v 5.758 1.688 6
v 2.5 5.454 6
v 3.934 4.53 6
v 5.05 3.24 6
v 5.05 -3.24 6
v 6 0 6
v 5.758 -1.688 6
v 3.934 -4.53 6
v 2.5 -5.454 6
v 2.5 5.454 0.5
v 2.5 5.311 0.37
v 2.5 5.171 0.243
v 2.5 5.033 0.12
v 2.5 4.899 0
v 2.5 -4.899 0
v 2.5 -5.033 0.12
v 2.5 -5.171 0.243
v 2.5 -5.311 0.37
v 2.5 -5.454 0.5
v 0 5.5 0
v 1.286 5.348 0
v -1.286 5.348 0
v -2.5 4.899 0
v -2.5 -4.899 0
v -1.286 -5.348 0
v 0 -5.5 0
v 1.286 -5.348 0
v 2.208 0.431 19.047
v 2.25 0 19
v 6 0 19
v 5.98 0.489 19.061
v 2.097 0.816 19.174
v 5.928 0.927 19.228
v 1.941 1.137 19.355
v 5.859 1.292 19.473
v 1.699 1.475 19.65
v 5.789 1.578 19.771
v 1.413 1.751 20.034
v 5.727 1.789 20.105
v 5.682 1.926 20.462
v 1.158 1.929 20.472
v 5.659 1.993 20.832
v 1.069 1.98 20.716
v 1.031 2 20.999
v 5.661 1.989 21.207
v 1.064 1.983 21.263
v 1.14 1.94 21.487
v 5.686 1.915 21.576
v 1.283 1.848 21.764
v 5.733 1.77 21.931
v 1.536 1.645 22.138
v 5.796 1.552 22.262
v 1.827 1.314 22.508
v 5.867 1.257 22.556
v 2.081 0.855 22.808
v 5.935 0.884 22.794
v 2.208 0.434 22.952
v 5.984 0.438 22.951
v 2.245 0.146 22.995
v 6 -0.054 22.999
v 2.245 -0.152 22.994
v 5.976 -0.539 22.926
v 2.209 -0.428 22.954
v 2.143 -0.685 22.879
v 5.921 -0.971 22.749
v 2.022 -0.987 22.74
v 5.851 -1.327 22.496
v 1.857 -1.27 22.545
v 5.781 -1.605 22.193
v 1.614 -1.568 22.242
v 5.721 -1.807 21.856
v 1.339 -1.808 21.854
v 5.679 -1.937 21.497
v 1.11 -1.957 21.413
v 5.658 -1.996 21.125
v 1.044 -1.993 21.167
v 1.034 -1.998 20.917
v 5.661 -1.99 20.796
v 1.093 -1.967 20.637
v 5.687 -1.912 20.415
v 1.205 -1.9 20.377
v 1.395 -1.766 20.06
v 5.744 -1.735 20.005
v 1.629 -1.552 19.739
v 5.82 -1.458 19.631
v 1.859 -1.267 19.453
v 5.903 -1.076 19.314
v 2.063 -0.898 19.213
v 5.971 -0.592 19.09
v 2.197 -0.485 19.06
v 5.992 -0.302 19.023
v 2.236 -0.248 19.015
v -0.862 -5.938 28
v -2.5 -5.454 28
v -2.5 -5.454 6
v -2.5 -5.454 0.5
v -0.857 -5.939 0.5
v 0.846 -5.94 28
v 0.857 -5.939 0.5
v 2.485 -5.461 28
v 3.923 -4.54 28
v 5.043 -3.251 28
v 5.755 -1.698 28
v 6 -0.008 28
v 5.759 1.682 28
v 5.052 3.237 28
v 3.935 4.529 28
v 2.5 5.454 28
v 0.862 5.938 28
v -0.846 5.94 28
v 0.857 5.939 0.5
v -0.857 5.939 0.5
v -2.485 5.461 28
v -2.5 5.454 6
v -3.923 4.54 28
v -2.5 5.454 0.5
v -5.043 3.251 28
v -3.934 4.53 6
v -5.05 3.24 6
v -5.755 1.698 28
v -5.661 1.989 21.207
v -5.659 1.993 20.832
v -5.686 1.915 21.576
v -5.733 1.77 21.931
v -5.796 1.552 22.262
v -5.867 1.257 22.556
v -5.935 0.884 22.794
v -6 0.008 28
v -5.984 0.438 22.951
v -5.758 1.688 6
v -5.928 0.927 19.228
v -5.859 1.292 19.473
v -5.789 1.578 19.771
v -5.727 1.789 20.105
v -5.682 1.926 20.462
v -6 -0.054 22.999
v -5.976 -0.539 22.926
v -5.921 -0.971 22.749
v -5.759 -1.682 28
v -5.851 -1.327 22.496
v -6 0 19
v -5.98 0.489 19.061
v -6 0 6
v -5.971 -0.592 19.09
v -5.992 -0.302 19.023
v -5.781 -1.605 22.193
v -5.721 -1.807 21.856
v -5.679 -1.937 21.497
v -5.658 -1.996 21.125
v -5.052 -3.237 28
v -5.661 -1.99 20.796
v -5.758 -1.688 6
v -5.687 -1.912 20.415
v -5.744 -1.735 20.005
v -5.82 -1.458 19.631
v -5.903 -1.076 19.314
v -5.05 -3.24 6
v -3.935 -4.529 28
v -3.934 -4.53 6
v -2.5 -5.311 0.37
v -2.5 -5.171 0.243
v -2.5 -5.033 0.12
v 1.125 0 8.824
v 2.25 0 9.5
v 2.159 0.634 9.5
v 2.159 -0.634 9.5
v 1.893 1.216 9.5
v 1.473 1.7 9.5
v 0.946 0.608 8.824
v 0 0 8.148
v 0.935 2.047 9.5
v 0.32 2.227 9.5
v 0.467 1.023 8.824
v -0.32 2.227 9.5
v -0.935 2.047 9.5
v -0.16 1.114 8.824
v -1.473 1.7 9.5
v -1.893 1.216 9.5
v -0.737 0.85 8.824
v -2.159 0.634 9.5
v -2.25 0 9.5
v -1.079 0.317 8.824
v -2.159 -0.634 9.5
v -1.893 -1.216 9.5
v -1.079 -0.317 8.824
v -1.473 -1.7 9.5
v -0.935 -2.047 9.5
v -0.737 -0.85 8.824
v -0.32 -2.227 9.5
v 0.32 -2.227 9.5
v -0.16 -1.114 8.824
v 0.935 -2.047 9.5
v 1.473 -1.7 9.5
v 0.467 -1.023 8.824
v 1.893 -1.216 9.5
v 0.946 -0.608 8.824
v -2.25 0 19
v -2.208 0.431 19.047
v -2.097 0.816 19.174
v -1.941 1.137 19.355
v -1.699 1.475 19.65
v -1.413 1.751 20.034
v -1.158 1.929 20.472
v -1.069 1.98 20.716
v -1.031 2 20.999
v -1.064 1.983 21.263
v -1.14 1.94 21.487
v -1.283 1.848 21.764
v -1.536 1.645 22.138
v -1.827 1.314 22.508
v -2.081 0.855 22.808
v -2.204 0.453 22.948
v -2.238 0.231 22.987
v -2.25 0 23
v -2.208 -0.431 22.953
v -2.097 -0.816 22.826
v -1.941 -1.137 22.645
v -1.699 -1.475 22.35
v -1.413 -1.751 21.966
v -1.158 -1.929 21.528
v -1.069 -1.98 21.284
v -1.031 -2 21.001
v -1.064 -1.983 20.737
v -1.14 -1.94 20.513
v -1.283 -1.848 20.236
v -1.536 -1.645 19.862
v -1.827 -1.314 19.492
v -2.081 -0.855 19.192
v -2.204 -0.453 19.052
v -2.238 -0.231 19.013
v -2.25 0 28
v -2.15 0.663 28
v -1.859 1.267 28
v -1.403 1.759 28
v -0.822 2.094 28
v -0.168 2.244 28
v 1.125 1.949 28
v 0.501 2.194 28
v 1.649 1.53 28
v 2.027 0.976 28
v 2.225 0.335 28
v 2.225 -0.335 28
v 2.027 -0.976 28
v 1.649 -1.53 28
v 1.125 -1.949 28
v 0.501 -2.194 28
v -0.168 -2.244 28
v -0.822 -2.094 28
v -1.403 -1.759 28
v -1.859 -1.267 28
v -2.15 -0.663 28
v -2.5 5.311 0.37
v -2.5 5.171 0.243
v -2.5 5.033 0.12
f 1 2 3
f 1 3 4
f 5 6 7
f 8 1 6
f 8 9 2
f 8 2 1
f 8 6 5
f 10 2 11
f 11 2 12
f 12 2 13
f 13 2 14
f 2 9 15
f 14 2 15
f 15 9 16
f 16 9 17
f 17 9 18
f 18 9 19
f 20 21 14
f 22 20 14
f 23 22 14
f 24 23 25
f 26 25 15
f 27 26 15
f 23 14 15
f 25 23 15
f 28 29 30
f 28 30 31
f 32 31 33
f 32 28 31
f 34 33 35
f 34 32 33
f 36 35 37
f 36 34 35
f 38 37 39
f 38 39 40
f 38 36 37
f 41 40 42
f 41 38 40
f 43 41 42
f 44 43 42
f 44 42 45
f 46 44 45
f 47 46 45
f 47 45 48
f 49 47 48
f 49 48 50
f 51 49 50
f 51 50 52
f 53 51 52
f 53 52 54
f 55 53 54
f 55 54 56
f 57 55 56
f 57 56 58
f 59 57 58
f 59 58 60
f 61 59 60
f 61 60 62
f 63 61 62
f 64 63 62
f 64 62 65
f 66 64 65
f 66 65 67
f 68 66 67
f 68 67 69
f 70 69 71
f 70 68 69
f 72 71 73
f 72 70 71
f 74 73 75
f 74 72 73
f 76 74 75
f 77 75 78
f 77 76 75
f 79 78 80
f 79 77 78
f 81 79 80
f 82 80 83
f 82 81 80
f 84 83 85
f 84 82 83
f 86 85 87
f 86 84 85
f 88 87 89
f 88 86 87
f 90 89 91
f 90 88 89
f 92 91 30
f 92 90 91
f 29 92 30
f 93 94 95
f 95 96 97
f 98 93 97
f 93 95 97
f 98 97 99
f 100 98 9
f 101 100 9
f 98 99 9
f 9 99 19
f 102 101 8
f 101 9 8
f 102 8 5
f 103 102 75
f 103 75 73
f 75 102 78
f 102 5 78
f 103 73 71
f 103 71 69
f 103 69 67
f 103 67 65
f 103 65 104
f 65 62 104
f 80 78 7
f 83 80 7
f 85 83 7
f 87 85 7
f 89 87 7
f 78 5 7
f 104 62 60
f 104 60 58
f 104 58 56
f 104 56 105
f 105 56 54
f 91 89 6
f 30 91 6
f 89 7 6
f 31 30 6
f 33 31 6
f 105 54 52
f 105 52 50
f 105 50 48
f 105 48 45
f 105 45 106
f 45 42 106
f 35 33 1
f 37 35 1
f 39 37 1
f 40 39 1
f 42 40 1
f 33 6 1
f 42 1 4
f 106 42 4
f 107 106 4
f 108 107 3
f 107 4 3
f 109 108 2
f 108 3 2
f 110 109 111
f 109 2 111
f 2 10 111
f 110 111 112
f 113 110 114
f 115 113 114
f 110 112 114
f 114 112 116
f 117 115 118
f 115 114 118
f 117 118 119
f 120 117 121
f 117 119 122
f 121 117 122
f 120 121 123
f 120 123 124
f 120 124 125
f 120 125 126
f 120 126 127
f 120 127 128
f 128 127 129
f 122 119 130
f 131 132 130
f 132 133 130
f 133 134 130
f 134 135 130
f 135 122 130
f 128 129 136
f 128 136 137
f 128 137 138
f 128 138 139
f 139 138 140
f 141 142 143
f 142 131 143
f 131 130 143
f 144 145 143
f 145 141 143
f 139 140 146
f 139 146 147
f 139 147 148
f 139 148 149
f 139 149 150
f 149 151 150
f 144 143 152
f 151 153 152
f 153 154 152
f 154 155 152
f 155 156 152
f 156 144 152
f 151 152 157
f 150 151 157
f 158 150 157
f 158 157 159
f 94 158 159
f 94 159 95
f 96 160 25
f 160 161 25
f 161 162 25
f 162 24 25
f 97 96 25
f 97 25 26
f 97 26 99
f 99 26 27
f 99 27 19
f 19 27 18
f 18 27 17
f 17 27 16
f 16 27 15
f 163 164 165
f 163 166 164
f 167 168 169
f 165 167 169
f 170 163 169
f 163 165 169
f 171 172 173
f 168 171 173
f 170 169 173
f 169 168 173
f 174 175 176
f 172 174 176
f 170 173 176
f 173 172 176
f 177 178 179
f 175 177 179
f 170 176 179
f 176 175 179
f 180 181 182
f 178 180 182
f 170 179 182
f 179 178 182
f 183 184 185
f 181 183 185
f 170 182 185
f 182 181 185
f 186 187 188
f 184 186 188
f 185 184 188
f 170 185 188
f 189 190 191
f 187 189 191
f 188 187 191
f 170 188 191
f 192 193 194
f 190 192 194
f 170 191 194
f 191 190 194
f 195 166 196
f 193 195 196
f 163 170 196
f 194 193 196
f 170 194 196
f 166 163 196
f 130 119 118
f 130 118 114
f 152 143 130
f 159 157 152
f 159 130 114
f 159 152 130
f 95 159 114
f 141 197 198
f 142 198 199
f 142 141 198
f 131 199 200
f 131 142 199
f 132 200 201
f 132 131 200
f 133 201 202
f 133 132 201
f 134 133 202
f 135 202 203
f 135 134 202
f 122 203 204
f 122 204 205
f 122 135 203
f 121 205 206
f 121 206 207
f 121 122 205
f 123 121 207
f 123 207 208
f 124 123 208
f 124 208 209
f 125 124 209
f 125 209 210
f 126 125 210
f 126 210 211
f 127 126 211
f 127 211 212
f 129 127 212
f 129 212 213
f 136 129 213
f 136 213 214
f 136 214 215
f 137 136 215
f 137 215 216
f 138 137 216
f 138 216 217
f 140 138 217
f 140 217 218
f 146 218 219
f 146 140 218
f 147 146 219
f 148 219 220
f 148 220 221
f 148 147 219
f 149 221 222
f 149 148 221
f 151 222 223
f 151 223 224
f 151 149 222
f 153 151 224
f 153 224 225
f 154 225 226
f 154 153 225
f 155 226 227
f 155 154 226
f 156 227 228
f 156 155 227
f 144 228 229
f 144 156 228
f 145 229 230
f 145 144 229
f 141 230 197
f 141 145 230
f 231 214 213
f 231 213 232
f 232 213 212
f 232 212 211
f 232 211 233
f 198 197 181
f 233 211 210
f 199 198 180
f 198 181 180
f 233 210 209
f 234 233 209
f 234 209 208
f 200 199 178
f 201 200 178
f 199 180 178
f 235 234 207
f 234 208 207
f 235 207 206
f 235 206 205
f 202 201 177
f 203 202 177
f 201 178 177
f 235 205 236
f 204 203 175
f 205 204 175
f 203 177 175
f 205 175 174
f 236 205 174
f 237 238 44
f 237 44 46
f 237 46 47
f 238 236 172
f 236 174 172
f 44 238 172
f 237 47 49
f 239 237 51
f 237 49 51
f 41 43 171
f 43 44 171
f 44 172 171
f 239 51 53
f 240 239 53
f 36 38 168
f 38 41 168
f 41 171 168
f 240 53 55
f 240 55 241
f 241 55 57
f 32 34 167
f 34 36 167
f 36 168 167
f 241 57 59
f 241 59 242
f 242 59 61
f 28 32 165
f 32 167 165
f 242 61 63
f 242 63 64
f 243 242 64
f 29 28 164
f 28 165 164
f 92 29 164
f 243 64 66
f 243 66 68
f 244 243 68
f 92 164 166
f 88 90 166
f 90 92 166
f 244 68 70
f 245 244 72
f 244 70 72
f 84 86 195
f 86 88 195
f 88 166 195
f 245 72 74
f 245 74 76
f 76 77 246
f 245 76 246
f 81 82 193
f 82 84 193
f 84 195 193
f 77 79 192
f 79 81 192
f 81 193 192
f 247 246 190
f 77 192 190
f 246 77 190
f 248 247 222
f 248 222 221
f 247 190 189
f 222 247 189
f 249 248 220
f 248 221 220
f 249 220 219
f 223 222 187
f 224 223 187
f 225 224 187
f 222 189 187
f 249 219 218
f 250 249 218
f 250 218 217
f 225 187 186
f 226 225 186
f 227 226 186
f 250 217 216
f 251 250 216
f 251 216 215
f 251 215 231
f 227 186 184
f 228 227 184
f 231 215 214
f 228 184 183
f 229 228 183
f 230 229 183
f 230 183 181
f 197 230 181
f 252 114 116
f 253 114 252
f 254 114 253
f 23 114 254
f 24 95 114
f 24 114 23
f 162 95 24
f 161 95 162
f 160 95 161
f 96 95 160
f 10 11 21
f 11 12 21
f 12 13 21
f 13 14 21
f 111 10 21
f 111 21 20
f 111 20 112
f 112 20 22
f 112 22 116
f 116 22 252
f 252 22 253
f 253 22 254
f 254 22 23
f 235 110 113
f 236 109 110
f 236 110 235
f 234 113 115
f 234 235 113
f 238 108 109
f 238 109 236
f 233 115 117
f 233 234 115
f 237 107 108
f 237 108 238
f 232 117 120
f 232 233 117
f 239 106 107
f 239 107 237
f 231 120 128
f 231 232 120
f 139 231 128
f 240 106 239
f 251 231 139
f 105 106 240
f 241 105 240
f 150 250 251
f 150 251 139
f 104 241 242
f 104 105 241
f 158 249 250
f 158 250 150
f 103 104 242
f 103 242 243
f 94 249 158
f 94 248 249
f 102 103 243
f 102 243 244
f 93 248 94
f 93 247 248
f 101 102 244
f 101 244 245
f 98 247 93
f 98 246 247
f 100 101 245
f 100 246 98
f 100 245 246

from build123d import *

# Parameters (mm, degrees)
ESQUISSE1_R                  = 6
CYLINDRE_EXTERIEUR_DEPTH     = 28
TENON_DEPTH                  = 10
TENON_DEPTH_BACK             = 10
ESQUISSE3_W                  = 6
ESQUISSE3_H                  = 7
ESQUISSE3_H_2                = 9
CHANFREIN1_SIZE              = 0.5
PER_AGE1_D                   = 4.5
PER_AGE1_DEPTH               = 18.5
PER_AGE1_TIP                 = 1.351936393
ENL_V_MAT_EXTRU_2_DEPTH      = 10
ENL_V_MAT_EXTRU_2_DEPTH_BACK = 30.257477677
ESQUISSE6_R                  = 2


with BuildPart() as part:
    # Esquisse1 → Cylindre exterieur (new body)
    with BuildSketch(Plane.XY):
        with Locations(Location((0, 0, 0), (0, 0, 245.375681648))):
            Circle(ESQUISSE1_R)
    extrude(amount=CYLINDRE_EXTERIEUR_DEPTH)

    # Esquisse3 → Tenon (cut, two sides: drawn at the far end of the back side and taken through both)
    with BuildSketch(Plane(origin=(0, 0, 0), x_dir=(1, 0, 0), z_dir=(0, 1, 0)).offset(-TENON_DEPTH_BACK)):
        with Locations((5.5, -2.5)):
            Rectangle(ESQUISSE3_W, ESQUISSE3_H)
        with Locations((-5.5, -1.5)):
            Rectangle(ESQUISSE3_W, ESQUISSE3_H_2)
    extrude(amount=TENON_DEPTH + TENON_DEPTH_BACK, mode=Mode.SUBTRACT)

    # Chanfrein1
    chanfrein1_edges = [part.edges().sort_by_distance(p)[0] for p in [
        (0, -6, 0),
        (0, 6, 0),
    ]]
    chamfer(chanfrein1_edges, length=CHANFREIN1_SIZE)

    # Perçage1
    with Locations(Plane.XY.offset(28)):
        with Locations((0, 0)):
            Hole(PER_AGE1_D / 2, depth=PER_AGE1_DEPTH)
            with Locations((0, 0, -(PER_AGE1_DEPTH + PER_AGE1_TIP / 2))):  # 118° drill point
                Cone(0, PER_AGE1_D / 2, PER_AGE1_TIP, mode=Mode.SUBTRACT)

    # Esquisse6 → Enlèv. mat.-Extru.2 (cut, two sides: drawn at the far end of the back side and taken through both)
    with BuildSketch(Plane(origin=(0, 0, 0), x_dir=(0, 0, -1), z_dir=(1, 0, 0)).offset(-ENL_V_MAT_EXTRU_2_DEPTH_BACK)):
        with Locations((-21, 0)):
            Circle(ESQUISSE6_R)
    extrude(amount=ENL_V_MAT_EXTRU_2_DEPTH + ENL_V_MAT_EXTRU_2_DEPTH_BACK, mode=Mode.SUBTRACT)


solid = part.part
